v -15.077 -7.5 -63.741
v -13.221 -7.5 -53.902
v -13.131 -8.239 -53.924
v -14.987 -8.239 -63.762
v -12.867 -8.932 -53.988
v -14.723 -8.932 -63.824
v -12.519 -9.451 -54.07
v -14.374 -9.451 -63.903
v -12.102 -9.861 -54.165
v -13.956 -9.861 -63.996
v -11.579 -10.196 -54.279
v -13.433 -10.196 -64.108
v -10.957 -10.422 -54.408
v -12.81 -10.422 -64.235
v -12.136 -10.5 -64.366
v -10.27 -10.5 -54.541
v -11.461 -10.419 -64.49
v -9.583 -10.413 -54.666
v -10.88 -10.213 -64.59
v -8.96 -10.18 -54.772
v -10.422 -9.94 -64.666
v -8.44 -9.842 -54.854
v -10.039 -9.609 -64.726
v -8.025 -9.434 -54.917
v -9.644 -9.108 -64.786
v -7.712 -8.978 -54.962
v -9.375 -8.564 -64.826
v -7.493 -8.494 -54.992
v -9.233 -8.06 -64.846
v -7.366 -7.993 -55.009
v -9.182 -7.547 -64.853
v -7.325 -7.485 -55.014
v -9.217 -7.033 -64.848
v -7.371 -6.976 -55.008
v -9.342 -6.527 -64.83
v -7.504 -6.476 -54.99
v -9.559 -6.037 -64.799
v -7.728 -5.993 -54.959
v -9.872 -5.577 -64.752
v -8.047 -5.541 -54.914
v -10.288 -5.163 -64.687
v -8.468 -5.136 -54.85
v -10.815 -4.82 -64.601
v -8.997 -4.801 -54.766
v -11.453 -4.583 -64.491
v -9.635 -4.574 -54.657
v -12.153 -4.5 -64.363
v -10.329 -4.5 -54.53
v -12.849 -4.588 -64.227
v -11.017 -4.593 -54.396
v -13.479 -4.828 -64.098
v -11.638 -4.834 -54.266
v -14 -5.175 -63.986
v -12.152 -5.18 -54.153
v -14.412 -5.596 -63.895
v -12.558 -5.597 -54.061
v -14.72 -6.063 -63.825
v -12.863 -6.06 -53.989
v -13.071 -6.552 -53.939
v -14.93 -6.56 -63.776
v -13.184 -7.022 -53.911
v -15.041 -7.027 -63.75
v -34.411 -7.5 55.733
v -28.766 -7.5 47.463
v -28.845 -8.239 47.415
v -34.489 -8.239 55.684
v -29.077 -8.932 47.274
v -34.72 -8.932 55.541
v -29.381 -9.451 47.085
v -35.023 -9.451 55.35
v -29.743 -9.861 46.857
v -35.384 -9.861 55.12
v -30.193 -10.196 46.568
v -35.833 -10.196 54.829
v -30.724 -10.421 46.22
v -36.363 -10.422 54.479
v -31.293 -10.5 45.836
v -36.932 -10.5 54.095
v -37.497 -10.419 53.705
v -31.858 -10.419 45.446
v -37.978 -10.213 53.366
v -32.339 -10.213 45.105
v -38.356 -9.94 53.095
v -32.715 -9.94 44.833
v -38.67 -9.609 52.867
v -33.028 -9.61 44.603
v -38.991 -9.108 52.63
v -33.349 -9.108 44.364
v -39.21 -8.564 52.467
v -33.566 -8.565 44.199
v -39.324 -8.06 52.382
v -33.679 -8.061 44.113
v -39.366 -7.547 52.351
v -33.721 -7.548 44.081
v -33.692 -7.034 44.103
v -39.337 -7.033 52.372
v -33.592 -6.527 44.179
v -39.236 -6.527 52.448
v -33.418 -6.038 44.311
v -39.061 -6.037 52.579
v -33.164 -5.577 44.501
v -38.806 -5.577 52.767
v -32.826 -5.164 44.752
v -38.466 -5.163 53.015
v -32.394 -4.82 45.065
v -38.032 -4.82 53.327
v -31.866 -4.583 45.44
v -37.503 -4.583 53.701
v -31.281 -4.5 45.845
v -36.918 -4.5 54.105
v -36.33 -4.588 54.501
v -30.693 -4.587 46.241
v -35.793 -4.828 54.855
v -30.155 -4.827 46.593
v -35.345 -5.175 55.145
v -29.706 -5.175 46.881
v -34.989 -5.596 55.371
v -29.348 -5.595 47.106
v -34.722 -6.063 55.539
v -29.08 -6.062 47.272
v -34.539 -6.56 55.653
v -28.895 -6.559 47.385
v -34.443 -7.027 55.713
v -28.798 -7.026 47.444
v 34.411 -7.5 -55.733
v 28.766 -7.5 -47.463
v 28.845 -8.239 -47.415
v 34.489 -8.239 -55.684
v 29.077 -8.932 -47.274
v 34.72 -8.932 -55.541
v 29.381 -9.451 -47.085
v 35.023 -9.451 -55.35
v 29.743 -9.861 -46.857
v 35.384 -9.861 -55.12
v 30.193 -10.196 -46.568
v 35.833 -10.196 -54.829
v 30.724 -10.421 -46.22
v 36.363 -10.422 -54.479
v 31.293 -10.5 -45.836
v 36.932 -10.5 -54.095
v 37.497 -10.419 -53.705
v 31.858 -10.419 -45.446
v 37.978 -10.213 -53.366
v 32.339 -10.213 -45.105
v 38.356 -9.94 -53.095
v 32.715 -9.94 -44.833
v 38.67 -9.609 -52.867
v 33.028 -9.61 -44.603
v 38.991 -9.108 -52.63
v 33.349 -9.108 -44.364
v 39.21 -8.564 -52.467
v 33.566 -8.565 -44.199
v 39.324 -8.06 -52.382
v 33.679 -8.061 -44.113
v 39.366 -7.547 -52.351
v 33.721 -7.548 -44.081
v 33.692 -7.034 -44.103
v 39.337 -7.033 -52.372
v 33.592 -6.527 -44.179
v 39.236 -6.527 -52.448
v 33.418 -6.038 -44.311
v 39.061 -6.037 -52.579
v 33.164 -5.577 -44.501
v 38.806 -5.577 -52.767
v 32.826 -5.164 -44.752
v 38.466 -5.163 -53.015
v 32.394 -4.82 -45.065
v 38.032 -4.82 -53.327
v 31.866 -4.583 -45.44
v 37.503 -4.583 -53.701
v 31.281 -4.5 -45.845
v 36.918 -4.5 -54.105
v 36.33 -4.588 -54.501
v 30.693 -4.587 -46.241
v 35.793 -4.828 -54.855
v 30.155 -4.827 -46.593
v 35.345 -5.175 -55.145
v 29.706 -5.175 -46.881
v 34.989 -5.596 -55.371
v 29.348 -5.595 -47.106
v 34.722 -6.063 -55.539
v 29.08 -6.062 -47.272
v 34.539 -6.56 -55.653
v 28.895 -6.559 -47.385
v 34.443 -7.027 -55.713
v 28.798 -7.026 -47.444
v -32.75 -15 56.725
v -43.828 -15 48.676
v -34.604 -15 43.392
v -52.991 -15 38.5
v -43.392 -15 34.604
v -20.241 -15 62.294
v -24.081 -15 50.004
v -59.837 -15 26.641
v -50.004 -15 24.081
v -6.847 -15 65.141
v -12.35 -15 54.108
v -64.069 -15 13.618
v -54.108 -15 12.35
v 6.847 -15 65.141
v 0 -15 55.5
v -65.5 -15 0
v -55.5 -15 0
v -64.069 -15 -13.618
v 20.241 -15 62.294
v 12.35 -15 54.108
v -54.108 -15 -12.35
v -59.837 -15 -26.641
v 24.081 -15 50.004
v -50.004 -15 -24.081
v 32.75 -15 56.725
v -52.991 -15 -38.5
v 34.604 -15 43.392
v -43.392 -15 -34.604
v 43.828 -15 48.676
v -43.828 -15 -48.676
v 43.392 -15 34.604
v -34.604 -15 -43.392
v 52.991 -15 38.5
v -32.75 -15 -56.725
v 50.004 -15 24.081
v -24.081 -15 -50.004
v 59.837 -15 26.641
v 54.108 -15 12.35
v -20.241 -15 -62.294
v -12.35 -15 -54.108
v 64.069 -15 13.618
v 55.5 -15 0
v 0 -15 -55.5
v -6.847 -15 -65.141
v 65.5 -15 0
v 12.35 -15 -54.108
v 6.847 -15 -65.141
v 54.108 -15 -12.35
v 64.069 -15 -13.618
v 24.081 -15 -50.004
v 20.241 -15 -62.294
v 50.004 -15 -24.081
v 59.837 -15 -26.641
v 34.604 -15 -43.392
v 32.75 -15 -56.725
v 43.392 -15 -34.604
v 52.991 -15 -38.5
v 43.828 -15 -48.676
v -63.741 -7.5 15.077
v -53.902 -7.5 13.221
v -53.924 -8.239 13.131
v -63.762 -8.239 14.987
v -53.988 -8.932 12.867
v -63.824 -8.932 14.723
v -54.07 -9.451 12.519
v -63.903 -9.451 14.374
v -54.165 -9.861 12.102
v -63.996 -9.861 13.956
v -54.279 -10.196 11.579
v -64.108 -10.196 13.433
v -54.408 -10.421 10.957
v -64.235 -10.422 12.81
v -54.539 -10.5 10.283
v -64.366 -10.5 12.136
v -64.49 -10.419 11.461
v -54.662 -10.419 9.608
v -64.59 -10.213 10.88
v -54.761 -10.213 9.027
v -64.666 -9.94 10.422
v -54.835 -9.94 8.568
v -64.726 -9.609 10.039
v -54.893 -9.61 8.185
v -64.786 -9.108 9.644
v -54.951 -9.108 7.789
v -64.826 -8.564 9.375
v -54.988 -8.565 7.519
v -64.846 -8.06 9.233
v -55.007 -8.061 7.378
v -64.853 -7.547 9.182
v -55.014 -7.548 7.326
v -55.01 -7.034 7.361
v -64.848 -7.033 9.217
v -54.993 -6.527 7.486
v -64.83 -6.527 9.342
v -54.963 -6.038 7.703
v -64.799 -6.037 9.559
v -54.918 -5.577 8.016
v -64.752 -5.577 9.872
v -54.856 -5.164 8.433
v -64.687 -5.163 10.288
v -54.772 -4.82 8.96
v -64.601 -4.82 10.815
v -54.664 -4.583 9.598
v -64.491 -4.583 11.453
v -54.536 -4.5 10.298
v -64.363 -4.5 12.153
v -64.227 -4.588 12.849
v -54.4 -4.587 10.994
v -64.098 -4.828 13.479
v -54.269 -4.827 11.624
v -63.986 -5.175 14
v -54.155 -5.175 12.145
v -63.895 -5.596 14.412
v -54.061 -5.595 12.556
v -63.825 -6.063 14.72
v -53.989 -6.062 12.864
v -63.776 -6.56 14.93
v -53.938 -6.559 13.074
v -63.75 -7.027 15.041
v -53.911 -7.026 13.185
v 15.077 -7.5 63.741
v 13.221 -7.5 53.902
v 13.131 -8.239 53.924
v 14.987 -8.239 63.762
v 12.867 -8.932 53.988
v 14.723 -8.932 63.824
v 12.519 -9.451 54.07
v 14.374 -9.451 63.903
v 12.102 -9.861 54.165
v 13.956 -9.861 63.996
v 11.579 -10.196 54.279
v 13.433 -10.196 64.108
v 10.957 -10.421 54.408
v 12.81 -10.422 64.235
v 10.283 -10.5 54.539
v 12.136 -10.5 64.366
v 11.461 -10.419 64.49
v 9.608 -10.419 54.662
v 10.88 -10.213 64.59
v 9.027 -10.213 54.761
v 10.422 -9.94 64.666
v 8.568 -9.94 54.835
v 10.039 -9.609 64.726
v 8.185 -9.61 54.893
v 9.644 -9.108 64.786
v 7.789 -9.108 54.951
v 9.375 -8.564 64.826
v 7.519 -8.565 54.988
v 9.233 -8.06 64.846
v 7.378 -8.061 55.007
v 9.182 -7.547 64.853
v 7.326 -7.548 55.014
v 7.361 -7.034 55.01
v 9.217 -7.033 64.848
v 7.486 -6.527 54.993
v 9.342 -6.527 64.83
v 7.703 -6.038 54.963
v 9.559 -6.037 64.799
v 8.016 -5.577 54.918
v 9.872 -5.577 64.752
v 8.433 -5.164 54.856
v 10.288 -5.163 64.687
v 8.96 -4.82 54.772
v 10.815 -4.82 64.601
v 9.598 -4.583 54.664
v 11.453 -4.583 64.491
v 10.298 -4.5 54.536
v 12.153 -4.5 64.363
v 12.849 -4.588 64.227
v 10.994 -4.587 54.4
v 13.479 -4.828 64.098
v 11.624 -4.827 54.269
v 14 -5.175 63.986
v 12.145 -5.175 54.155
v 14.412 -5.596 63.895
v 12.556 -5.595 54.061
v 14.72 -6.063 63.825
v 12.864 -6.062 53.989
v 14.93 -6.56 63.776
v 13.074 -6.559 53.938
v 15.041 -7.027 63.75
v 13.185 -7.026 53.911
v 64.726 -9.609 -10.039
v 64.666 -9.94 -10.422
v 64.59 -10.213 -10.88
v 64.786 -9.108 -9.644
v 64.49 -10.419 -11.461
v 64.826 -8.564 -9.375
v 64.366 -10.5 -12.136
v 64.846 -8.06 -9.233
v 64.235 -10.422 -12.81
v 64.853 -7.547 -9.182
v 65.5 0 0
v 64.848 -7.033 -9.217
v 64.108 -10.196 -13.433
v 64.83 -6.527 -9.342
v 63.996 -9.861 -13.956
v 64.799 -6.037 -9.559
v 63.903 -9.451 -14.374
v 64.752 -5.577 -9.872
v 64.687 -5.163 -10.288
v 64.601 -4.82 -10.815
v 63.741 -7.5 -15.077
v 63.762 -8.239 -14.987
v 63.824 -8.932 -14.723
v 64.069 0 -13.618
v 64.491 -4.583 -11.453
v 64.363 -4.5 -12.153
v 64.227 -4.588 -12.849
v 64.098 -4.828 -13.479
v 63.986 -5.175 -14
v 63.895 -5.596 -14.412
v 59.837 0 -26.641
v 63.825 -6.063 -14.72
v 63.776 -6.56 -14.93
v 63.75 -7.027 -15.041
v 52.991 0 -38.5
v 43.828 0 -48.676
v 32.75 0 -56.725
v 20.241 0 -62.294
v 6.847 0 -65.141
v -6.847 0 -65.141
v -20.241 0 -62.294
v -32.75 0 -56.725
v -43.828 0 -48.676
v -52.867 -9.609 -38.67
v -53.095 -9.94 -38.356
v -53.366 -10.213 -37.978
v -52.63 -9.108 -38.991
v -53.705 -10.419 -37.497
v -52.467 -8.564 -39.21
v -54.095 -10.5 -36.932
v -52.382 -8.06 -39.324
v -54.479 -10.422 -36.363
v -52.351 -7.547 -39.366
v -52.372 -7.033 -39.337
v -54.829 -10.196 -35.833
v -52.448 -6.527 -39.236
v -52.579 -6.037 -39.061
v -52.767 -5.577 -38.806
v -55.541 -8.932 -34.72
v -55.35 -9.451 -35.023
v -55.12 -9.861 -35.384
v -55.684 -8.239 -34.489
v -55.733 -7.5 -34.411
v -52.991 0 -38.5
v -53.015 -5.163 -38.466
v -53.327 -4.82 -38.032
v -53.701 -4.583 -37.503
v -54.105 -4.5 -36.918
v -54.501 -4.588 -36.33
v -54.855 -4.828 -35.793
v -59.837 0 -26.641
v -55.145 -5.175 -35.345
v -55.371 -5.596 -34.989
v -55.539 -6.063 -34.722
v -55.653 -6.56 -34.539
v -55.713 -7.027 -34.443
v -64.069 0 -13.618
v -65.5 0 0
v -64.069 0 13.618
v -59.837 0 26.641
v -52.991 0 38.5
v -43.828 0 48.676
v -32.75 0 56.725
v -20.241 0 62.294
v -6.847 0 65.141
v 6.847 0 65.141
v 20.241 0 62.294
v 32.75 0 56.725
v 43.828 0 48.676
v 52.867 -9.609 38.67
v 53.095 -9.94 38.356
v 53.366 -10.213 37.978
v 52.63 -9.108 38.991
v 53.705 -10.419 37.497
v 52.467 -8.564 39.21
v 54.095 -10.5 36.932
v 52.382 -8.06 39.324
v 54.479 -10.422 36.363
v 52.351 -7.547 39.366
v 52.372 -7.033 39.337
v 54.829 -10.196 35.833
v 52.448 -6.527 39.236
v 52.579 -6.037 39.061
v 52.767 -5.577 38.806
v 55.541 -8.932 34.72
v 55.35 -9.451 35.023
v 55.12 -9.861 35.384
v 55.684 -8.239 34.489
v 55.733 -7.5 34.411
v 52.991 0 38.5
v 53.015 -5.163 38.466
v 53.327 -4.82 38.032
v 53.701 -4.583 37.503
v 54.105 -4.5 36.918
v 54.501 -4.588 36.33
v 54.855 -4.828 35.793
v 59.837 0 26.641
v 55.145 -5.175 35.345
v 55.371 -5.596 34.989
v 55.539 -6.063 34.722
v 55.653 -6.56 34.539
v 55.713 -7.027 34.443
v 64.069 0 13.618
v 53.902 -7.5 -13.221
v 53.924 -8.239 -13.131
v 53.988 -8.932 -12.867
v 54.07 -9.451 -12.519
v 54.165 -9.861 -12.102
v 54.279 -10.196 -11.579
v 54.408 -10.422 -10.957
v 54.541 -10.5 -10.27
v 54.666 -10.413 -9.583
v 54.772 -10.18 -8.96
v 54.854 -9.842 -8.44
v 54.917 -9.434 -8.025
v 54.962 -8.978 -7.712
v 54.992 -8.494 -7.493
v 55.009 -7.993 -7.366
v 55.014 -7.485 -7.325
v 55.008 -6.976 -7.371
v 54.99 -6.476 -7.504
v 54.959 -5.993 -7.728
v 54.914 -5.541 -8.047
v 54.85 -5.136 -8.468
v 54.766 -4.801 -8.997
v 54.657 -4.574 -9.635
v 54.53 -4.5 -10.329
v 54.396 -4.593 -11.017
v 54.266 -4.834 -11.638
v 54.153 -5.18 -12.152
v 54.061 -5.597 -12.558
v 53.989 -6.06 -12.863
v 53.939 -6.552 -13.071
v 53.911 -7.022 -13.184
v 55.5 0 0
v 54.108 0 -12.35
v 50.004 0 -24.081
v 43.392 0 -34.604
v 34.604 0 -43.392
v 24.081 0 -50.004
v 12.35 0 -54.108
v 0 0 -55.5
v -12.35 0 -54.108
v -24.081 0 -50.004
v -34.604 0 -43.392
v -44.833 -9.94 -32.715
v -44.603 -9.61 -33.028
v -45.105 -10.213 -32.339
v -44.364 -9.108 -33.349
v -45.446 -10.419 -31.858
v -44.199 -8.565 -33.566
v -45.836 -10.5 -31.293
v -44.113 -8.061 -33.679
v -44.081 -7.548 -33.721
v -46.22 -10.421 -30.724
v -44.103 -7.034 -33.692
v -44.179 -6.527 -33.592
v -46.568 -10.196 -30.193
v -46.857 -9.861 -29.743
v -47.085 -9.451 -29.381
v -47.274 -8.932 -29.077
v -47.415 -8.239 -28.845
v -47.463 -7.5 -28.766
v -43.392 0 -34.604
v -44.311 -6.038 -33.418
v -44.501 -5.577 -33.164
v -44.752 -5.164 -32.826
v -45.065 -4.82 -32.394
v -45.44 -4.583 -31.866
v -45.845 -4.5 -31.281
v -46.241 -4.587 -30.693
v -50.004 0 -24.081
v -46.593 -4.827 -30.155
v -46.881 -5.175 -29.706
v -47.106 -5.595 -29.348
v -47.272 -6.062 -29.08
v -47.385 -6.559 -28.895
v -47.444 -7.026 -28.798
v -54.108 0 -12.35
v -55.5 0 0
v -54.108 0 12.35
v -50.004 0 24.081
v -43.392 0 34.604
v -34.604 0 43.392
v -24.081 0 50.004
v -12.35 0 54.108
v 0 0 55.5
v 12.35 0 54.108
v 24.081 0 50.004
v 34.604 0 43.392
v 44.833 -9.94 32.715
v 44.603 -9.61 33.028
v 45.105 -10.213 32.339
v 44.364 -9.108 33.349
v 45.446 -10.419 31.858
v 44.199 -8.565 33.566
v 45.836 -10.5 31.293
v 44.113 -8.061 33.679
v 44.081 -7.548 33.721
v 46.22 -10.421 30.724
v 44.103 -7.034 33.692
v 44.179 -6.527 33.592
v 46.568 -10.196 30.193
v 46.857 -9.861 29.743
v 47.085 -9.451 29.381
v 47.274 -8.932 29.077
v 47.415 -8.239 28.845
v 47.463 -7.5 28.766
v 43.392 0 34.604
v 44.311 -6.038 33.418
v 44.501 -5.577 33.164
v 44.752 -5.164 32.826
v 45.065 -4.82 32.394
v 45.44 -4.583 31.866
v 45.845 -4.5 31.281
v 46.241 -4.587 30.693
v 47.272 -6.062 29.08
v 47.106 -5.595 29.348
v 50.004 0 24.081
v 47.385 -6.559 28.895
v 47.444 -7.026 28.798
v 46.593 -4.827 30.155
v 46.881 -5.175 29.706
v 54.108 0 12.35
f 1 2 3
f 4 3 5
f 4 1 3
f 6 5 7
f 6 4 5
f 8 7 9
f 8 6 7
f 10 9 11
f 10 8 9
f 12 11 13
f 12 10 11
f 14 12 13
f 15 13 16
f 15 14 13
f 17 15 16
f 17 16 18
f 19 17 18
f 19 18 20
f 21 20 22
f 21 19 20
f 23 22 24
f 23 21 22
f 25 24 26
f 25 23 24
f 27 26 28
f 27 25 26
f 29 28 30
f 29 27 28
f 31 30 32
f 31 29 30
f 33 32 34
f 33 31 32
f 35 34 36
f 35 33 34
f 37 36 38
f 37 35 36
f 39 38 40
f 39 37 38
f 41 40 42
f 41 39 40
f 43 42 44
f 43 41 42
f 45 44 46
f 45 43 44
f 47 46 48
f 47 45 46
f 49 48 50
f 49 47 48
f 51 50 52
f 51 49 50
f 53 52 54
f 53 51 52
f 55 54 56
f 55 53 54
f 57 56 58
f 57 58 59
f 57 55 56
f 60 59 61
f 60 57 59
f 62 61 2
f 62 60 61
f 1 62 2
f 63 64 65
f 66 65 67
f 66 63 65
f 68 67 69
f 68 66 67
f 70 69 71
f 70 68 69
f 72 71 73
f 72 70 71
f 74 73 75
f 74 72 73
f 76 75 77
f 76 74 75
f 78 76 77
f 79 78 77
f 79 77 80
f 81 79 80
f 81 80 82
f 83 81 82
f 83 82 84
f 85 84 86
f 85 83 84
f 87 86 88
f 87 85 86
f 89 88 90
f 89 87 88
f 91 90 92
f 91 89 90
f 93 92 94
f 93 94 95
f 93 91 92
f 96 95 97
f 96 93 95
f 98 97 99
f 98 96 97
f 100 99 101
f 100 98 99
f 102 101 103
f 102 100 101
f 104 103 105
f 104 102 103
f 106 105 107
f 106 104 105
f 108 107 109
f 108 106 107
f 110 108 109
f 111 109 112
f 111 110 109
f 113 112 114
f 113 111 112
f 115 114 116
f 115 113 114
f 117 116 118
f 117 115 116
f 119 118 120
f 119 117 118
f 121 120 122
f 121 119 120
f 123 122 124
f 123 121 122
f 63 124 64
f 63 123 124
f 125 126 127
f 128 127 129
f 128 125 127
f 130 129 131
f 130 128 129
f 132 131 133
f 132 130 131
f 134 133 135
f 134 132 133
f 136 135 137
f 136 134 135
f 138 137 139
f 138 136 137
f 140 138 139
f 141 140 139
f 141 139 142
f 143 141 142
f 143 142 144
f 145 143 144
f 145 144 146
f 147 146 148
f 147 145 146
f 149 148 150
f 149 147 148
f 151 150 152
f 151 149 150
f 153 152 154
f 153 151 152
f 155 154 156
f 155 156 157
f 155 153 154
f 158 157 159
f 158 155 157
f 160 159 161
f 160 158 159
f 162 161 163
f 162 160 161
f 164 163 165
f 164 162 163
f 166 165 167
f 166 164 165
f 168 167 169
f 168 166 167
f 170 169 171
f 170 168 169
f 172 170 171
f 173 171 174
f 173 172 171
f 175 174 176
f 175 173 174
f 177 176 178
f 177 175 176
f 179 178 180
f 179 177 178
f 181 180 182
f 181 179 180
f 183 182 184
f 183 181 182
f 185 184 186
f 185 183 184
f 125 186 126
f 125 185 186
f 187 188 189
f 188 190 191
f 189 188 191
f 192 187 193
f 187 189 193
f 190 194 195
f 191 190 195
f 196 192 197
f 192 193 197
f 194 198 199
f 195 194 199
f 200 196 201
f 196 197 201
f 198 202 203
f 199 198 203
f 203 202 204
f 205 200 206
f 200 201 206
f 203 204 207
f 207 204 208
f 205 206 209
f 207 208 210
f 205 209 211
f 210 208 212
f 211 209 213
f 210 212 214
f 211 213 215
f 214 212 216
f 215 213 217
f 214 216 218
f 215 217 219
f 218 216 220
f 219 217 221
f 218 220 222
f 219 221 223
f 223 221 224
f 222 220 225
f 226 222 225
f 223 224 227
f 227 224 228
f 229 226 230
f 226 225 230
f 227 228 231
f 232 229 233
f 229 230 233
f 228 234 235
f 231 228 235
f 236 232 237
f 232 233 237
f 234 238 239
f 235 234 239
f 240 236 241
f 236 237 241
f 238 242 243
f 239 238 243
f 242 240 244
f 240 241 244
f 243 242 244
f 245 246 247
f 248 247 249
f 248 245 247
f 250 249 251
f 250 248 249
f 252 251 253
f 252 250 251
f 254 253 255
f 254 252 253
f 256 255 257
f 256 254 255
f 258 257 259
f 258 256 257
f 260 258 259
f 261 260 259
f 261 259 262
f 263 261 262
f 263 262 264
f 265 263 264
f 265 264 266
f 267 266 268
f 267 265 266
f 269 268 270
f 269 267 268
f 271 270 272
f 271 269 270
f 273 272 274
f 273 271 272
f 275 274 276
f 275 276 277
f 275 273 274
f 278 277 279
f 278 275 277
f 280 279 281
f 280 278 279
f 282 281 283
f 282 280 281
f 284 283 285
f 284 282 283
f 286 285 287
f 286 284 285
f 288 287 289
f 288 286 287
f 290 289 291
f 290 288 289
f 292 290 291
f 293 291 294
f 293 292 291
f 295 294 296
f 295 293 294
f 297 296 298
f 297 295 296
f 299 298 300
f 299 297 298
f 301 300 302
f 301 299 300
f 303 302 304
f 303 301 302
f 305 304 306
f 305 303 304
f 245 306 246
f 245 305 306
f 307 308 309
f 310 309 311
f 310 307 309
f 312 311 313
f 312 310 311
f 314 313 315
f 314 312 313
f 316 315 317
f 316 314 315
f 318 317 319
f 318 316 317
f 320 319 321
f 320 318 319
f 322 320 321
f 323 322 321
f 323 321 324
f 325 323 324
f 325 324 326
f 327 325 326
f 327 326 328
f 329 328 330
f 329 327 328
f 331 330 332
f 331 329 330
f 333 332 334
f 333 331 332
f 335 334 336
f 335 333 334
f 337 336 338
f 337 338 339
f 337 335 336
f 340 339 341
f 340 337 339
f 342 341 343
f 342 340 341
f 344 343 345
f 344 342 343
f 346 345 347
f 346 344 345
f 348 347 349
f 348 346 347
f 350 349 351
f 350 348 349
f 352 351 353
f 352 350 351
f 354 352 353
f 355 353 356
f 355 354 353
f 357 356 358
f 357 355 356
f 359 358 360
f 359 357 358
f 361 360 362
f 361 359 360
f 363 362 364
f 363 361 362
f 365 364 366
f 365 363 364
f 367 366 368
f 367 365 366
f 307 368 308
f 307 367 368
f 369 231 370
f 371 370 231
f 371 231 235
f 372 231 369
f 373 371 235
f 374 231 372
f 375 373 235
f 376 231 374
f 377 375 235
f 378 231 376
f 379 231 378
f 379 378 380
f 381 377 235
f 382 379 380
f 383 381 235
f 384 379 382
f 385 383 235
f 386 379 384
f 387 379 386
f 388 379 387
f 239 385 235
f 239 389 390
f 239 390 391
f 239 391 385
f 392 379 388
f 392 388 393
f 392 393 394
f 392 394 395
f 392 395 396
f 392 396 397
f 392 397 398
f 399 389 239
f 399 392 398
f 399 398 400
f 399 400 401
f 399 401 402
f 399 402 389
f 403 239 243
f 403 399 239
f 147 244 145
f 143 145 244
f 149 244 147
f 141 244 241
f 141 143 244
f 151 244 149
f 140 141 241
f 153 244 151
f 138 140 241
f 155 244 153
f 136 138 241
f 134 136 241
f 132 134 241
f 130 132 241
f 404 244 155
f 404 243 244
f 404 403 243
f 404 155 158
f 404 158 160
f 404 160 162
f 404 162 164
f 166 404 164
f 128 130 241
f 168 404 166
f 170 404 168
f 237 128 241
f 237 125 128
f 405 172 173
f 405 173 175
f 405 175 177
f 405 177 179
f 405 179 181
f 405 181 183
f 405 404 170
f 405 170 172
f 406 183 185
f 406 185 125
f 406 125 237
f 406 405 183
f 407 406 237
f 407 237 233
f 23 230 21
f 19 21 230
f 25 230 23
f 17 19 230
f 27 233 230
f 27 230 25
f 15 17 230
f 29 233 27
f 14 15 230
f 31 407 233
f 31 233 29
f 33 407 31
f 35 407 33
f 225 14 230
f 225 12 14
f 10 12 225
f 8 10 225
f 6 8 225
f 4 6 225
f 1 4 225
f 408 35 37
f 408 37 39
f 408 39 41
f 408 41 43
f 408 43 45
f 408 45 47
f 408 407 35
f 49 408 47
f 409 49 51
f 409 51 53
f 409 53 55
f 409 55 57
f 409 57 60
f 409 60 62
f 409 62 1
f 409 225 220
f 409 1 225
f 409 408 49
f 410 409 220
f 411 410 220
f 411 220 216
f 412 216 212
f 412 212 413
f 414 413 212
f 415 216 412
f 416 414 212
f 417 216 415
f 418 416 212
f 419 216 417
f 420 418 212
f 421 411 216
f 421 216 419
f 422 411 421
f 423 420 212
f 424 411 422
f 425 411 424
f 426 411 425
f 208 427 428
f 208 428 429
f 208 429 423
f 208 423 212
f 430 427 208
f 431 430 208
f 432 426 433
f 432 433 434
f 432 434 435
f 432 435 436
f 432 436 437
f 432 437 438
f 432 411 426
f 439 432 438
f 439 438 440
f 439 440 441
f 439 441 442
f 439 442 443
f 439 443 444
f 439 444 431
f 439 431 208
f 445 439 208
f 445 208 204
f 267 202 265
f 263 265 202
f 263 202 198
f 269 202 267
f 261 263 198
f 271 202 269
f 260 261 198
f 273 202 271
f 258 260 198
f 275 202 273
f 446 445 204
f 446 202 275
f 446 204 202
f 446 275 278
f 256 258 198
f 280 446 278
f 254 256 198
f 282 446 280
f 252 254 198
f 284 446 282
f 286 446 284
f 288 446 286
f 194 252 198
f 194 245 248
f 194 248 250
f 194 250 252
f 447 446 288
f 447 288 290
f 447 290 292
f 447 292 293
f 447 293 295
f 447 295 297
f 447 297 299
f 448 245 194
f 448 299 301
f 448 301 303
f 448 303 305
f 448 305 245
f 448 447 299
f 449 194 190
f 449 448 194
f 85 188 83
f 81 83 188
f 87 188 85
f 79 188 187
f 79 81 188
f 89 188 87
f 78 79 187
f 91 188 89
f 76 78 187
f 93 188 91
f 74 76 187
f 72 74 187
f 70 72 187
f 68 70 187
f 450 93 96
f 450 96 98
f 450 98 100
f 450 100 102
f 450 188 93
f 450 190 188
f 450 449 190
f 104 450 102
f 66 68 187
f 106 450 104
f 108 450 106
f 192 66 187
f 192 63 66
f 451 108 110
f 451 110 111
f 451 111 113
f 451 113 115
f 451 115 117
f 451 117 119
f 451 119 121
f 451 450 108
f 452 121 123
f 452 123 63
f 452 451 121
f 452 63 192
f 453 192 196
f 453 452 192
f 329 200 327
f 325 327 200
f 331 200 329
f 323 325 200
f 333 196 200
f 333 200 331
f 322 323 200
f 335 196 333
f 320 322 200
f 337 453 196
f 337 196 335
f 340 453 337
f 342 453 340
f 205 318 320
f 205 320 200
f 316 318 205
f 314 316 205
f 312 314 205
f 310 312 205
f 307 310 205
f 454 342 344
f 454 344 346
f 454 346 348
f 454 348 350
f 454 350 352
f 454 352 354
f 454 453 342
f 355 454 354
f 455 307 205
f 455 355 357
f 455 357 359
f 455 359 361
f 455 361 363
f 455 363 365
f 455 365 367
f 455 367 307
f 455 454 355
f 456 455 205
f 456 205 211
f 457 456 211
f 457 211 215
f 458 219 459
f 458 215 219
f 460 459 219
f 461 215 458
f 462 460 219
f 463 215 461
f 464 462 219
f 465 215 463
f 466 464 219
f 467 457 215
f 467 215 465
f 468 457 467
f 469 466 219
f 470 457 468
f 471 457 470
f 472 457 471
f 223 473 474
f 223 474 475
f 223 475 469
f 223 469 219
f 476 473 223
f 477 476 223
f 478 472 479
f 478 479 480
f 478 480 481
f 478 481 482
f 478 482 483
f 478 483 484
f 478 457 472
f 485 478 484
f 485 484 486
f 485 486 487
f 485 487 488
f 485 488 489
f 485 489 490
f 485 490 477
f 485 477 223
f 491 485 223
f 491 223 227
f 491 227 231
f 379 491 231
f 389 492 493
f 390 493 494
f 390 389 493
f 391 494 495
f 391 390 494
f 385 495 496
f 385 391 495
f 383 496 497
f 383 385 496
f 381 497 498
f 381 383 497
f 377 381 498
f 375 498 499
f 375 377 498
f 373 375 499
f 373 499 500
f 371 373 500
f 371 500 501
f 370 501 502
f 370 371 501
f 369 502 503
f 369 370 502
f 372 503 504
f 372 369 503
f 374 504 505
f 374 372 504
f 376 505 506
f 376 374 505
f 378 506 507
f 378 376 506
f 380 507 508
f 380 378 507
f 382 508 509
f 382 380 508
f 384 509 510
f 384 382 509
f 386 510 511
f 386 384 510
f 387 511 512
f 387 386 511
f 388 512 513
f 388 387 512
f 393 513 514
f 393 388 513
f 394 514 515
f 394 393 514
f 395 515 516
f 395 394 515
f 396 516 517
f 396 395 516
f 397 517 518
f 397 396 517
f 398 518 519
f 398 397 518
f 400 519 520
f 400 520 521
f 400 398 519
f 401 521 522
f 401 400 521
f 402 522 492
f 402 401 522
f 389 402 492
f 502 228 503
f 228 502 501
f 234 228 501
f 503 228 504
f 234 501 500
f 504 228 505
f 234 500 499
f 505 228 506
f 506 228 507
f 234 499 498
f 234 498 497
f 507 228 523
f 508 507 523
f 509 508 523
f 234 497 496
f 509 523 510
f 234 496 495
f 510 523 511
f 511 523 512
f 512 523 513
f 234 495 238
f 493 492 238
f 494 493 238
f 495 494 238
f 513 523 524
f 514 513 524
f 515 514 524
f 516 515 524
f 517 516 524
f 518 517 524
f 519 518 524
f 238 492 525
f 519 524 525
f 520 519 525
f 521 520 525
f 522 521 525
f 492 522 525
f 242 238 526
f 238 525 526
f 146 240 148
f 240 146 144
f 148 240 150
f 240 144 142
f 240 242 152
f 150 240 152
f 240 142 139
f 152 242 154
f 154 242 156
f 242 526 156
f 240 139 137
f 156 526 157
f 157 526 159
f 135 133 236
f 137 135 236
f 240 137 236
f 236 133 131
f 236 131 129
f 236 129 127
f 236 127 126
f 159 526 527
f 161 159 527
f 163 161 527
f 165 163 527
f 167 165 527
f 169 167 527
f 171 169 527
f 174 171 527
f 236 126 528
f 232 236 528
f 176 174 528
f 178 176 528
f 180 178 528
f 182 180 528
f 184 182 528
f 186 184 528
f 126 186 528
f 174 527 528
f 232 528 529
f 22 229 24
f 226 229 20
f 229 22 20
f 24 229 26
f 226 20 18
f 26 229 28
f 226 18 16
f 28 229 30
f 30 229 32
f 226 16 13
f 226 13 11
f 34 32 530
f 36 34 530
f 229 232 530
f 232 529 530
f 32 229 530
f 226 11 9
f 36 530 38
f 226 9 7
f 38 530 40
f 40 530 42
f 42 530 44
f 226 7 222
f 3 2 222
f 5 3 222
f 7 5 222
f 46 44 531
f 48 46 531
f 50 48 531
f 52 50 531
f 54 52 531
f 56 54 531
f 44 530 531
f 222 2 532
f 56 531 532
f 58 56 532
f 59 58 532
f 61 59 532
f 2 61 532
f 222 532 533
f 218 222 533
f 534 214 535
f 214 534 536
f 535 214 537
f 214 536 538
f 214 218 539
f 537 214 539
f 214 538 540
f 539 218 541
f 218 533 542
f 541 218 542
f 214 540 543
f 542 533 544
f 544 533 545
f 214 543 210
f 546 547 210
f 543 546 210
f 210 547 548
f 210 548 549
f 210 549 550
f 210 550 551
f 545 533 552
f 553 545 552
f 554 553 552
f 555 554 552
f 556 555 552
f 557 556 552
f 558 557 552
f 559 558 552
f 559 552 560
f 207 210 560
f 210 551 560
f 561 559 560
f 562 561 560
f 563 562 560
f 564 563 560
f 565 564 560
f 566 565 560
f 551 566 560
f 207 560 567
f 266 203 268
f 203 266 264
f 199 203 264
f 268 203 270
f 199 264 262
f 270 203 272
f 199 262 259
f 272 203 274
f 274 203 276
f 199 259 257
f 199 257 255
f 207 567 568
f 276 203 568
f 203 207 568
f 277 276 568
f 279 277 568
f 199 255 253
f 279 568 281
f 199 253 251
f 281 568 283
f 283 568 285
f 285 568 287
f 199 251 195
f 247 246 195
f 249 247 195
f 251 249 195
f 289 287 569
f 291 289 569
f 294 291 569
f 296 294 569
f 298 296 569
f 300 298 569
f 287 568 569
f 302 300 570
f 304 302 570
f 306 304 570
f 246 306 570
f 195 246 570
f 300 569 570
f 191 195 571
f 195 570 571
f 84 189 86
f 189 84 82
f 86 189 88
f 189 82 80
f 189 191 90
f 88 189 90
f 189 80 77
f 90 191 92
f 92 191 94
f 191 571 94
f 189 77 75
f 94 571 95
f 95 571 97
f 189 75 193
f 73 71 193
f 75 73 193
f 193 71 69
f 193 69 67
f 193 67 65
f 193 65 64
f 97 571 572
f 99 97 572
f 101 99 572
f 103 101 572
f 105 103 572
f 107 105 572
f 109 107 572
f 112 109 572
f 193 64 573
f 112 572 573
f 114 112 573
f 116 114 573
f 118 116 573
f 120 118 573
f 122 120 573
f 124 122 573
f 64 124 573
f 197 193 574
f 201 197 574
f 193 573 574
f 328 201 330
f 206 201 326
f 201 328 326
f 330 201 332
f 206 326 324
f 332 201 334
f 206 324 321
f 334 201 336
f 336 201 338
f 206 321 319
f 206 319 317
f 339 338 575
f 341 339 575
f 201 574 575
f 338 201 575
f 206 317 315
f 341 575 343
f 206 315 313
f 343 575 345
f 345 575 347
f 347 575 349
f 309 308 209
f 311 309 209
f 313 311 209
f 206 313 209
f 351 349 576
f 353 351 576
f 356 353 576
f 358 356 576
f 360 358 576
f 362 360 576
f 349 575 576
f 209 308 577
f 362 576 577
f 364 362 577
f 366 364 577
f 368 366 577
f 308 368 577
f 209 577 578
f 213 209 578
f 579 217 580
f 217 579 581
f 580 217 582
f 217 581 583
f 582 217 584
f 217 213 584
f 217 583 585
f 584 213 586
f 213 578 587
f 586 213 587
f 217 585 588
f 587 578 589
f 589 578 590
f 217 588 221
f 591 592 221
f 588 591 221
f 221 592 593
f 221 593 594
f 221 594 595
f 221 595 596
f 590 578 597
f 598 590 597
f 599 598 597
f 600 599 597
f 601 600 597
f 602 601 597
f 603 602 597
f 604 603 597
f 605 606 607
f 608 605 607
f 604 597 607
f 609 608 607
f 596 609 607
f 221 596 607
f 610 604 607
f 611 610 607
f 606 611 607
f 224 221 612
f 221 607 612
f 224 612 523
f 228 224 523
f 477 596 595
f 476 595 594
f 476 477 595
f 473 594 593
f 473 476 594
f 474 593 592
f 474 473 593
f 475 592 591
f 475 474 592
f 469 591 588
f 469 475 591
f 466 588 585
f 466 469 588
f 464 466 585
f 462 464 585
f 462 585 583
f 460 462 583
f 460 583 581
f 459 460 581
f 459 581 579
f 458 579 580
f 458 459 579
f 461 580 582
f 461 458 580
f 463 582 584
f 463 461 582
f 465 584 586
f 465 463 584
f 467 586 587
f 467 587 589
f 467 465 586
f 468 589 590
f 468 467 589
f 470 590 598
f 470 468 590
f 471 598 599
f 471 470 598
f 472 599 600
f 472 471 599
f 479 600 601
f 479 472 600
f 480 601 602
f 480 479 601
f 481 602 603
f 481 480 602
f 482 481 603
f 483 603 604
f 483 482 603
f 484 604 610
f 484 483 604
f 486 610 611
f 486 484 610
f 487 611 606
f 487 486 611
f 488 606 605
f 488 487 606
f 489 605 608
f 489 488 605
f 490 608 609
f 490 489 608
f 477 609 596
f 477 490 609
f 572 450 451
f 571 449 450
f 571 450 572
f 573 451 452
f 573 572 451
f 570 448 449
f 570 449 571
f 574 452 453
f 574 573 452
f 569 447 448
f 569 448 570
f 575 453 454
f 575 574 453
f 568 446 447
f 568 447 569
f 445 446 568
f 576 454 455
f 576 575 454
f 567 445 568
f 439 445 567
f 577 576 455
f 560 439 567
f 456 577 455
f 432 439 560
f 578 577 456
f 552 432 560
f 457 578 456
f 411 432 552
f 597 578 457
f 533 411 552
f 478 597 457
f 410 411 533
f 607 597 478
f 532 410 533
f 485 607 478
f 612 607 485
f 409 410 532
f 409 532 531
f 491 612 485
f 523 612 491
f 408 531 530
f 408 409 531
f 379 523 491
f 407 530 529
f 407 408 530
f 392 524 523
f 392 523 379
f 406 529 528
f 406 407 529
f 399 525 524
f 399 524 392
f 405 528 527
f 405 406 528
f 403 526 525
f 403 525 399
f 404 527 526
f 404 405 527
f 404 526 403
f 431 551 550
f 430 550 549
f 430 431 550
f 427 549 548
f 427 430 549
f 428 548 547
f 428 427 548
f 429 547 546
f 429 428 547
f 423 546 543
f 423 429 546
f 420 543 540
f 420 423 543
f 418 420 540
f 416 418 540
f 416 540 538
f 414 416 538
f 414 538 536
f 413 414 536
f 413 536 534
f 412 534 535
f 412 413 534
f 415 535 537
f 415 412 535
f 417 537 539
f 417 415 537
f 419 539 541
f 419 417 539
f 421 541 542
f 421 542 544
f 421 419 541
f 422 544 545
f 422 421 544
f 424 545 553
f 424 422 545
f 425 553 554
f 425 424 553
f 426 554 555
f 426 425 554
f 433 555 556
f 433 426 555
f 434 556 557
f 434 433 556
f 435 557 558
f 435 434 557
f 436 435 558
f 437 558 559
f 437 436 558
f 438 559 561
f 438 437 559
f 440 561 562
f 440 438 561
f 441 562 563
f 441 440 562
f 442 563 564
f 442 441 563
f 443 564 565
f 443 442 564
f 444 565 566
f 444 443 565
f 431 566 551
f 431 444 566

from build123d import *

# Parameters (mm, degrees)
SKETCH1_R           = 65.5
SKETCH1_R_2         = 55.5
BOSS_EXTRUDE1_DEPTH = 15
CIRPATTERN1_COUNT   = 8


with BuildPart() as part:
    # Sketch1 → Boss-Extrude1 (new body)
    with BuildSketch(Plane(origin=(0, 0, 0), x_dir=(1, 0, 0), z_dir=(0, 1, 0))):
        Circle(SKETCH1_R)
        Circle(SKETCH1_R_2, mode=Mode.SUBTRACT)
    extrude(amount=-BOSS_EXTRUDE1_DEPTH)

    # Sketch3 → Ø6.0 (6) Diameter Hole2 (revolve, cut)
    with BuildSketch(Plane(origin=(12.141952512, -7.5, 64.364765122), x_dir=(0.98266817, 0, -0.185373321), z_dir=(0, 1, 0))):
        Polygon((0, 0), (0, 67.301581857), (3, 65.499), (3, 0), align=None)
    f_6_0_6_diameter_hole2 = revolve(axis=Axis((13.319073099, -7.5, 70.604708), (-0.185373321, 0, -0.98266817)), mode=Mode.SUBTRACT)

    # CirPattern1: Ø6.0 (6) Diameter Hole2 ×8 about axis
    cirpattern1_axis = Axis((0, 0, 0), (0, 1, 0))
    for i in range(1, CIRPATTERN1_COUNT):
        add(f_6_0_6_diameter_hole2.rotate(cirpattern1_axis, i * 360 / CIRPATTERN1_COUNT), mode=Mode.SUBTRACT)


solid = part.part
